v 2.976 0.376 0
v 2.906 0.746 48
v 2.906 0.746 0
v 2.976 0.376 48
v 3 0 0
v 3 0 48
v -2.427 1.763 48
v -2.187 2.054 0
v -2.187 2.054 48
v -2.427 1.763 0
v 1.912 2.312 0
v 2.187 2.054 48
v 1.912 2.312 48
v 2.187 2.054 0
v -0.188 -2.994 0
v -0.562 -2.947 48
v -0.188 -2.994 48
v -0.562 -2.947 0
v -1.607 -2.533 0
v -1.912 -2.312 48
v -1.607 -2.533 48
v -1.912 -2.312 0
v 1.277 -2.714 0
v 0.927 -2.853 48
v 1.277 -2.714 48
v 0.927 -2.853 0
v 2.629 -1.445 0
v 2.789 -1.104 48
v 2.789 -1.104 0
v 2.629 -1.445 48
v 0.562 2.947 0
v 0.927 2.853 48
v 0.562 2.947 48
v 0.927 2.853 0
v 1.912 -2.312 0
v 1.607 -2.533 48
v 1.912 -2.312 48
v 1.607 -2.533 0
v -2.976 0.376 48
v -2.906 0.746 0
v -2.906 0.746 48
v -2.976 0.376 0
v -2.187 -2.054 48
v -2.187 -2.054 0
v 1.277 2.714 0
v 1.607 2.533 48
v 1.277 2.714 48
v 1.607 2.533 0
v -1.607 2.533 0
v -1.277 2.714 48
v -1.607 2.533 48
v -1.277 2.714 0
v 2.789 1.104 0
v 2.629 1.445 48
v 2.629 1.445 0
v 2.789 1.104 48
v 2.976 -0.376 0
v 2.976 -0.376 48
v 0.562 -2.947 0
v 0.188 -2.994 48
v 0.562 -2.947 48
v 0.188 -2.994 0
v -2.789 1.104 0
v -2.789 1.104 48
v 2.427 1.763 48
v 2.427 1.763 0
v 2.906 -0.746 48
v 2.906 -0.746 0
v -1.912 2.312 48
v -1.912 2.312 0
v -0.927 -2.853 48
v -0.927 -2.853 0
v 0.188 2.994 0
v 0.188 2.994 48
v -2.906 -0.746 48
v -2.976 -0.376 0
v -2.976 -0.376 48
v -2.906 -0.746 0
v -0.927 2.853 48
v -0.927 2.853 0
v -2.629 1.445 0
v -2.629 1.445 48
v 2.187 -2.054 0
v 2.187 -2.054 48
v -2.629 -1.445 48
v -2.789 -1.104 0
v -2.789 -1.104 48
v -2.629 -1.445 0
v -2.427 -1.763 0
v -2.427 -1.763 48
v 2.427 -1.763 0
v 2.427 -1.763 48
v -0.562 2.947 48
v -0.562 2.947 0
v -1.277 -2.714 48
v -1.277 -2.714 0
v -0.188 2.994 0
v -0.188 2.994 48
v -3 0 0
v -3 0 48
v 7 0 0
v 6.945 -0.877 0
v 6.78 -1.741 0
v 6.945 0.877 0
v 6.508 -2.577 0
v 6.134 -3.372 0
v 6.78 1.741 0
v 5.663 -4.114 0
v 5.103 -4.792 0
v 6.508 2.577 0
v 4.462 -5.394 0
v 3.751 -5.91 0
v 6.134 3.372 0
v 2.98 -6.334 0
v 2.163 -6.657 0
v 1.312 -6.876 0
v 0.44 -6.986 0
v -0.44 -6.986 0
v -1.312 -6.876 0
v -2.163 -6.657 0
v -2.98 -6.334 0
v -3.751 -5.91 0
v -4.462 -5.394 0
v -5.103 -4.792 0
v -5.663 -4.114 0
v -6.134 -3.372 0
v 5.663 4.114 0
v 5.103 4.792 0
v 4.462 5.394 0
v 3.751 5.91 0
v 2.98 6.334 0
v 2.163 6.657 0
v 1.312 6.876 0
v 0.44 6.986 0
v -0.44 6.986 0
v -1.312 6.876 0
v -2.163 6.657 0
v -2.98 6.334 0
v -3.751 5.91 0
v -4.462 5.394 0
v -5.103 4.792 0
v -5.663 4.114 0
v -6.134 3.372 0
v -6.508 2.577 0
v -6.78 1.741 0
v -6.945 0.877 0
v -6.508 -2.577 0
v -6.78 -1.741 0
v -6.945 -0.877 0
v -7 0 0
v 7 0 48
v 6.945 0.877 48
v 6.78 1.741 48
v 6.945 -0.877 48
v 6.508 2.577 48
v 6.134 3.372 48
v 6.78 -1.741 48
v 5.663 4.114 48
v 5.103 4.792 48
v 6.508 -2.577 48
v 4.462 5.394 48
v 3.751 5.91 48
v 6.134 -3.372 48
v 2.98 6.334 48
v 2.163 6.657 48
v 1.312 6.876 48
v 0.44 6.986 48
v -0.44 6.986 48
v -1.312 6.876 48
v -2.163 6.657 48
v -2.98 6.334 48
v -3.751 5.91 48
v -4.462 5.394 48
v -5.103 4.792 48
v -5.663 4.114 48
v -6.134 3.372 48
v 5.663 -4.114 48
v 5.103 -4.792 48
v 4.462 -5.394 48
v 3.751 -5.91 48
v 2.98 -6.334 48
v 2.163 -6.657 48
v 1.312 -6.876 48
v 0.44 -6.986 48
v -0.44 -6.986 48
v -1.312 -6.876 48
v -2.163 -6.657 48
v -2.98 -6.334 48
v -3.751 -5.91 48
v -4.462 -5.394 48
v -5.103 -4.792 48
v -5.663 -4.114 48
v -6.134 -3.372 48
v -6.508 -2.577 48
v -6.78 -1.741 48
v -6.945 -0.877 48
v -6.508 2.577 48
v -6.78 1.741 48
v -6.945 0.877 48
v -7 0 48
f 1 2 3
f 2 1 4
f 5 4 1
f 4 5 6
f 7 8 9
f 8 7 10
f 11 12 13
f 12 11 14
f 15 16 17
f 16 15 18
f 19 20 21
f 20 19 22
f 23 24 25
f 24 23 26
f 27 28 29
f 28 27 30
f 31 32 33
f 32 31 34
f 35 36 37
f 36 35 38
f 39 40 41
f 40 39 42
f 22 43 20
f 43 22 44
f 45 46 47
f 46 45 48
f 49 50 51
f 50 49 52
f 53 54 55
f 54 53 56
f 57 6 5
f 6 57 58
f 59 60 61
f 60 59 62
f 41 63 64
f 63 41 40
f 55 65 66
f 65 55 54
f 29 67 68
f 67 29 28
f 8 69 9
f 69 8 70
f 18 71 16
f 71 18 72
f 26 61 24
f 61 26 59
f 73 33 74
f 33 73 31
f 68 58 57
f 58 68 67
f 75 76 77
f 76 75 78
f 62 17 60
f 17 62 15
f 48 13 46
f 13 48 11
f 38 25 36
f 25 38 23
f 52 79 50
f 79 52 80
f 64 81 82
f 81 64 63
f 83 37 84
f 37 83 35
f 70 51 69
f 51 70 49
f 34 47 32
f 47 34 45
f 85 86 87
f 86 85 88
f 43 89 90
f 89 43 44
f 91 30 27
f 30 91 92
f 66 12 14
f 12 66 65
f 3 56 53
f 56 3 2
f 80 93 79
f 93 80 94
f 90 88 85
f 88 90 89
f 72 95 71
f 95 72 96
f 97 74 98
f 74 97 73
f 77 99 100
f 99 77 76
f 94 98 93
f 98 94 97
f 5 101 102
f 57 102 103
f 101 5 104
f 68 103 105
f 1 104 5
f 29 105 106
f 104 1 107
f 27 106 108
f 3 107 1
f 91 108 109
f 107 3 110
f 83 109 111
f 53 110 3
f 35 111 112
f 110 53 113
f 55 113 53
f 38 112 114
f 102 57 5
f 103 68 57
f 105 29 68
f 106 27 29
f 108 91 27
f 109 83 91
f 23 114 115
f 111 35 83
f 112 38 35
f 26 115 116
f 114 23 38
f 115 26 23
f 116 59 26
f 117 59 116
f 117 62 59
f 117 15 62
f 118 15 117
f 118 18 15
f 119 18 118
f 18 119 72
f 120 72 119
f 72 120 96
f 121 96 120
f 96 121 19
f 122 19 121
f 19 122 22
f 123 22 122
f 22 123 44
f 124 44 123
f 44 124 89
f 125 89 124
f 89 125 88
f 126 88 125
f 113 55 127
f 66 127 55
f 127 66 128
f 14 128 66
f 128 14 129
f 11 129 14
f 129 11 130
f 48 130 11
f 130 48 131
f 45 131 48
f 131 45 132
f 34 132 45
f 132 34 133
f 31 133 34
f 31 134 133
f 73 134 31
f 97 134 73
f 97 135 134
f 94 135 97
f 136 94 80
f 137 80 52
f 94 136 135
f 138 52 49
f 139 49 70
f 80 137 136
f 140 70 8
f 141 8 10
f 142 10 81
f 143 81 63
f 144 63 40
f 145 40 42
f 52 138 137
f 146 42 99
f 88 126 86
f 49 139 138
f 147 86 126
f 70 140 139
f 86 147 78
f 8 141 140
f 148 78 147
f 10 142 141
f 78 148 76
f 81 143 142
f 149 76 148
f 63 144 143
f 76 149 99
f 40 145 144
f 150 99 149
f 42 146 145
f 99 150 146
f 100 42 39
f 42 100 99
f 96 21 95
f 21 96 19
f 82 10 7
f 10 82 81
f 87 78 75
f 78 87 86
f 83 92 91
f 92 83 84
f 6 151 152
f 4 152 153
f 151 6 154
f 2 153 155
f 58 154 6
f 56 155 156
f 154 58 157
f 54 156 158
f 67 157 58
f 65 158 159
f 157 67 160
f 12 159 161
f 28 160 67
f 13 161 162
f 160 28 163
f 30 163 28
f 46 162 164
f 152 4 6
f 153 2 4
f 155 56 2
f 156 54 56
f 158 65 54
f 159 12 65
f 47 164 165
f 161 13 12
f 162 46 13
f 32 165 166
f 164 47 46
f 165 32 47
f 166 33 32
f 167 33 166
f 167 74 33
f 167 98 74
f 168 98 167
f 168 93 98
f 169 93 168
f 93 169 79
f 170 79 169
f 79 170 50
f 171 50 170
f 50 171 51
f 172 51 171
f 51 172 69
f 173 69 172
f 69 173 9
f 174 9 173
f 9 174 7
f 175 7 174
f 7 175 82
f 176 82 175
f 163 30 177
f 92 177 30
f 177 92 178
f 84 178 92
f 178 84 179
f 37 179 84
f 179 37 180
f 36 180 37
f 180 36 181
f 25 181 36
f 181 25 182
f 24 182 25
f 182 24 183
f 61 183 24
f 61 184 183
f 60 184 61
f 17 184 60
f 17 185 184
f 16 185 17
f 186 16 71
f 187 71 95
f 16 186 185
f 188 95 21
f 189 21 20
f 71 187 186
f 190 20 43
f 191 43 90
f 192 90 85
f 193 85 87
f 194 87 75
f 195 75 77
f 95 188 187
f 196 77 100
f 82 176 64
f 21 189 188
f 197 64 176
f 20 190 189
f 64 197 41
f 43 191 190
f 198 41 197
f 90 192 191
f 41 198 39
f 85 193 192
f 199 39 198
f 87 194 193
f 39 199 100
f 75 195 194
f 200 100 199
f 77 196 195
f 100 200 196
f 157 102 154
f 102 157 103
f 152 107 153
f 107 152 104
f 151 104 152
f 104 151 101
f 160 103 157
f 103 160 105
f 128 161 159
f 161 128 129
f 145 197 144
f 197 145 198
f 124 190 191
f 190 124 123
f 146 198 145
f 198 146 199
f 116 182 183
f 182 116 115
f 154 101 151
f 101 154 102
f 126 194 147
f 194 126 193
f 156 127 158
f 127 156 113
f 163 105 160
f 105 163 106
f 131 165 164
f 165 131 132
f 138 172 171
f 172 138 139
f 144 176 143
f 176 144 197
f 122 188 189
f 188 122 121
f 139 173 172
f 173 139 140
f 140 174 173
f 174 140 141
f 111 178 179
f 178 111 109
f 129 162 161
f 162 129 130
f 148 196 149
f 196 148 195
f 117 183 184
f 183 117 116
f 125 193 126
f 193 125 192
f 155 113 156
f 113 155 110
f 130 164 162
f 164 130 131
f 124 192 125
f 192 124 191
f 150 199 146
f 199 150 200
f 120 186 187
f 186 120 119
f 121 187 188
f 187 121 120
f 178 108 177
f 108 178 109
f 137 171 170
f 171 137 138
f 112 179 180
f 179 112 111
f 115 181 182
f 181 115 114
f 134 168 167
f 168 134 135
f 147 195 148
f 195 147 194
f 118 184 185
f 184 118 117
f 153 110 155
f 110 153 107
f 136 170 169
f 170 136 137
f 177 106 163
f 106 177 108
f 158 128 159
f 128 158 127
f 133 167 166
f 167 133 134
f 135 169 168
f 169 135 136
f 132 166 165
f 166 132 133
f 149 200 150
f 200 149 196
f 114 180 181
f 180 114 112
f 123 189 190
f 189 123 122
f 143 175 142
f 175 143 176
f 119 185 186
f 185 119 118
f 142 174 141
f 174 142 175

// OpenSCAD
$fn = 50;

difference() {
	union() {
		cylinder(h = 48, r = 7.0);
	}
	union() {
		cylinder(h = 48, r = 3.0);
		cylinder(h = 48, r = 1.5);
	}
}
